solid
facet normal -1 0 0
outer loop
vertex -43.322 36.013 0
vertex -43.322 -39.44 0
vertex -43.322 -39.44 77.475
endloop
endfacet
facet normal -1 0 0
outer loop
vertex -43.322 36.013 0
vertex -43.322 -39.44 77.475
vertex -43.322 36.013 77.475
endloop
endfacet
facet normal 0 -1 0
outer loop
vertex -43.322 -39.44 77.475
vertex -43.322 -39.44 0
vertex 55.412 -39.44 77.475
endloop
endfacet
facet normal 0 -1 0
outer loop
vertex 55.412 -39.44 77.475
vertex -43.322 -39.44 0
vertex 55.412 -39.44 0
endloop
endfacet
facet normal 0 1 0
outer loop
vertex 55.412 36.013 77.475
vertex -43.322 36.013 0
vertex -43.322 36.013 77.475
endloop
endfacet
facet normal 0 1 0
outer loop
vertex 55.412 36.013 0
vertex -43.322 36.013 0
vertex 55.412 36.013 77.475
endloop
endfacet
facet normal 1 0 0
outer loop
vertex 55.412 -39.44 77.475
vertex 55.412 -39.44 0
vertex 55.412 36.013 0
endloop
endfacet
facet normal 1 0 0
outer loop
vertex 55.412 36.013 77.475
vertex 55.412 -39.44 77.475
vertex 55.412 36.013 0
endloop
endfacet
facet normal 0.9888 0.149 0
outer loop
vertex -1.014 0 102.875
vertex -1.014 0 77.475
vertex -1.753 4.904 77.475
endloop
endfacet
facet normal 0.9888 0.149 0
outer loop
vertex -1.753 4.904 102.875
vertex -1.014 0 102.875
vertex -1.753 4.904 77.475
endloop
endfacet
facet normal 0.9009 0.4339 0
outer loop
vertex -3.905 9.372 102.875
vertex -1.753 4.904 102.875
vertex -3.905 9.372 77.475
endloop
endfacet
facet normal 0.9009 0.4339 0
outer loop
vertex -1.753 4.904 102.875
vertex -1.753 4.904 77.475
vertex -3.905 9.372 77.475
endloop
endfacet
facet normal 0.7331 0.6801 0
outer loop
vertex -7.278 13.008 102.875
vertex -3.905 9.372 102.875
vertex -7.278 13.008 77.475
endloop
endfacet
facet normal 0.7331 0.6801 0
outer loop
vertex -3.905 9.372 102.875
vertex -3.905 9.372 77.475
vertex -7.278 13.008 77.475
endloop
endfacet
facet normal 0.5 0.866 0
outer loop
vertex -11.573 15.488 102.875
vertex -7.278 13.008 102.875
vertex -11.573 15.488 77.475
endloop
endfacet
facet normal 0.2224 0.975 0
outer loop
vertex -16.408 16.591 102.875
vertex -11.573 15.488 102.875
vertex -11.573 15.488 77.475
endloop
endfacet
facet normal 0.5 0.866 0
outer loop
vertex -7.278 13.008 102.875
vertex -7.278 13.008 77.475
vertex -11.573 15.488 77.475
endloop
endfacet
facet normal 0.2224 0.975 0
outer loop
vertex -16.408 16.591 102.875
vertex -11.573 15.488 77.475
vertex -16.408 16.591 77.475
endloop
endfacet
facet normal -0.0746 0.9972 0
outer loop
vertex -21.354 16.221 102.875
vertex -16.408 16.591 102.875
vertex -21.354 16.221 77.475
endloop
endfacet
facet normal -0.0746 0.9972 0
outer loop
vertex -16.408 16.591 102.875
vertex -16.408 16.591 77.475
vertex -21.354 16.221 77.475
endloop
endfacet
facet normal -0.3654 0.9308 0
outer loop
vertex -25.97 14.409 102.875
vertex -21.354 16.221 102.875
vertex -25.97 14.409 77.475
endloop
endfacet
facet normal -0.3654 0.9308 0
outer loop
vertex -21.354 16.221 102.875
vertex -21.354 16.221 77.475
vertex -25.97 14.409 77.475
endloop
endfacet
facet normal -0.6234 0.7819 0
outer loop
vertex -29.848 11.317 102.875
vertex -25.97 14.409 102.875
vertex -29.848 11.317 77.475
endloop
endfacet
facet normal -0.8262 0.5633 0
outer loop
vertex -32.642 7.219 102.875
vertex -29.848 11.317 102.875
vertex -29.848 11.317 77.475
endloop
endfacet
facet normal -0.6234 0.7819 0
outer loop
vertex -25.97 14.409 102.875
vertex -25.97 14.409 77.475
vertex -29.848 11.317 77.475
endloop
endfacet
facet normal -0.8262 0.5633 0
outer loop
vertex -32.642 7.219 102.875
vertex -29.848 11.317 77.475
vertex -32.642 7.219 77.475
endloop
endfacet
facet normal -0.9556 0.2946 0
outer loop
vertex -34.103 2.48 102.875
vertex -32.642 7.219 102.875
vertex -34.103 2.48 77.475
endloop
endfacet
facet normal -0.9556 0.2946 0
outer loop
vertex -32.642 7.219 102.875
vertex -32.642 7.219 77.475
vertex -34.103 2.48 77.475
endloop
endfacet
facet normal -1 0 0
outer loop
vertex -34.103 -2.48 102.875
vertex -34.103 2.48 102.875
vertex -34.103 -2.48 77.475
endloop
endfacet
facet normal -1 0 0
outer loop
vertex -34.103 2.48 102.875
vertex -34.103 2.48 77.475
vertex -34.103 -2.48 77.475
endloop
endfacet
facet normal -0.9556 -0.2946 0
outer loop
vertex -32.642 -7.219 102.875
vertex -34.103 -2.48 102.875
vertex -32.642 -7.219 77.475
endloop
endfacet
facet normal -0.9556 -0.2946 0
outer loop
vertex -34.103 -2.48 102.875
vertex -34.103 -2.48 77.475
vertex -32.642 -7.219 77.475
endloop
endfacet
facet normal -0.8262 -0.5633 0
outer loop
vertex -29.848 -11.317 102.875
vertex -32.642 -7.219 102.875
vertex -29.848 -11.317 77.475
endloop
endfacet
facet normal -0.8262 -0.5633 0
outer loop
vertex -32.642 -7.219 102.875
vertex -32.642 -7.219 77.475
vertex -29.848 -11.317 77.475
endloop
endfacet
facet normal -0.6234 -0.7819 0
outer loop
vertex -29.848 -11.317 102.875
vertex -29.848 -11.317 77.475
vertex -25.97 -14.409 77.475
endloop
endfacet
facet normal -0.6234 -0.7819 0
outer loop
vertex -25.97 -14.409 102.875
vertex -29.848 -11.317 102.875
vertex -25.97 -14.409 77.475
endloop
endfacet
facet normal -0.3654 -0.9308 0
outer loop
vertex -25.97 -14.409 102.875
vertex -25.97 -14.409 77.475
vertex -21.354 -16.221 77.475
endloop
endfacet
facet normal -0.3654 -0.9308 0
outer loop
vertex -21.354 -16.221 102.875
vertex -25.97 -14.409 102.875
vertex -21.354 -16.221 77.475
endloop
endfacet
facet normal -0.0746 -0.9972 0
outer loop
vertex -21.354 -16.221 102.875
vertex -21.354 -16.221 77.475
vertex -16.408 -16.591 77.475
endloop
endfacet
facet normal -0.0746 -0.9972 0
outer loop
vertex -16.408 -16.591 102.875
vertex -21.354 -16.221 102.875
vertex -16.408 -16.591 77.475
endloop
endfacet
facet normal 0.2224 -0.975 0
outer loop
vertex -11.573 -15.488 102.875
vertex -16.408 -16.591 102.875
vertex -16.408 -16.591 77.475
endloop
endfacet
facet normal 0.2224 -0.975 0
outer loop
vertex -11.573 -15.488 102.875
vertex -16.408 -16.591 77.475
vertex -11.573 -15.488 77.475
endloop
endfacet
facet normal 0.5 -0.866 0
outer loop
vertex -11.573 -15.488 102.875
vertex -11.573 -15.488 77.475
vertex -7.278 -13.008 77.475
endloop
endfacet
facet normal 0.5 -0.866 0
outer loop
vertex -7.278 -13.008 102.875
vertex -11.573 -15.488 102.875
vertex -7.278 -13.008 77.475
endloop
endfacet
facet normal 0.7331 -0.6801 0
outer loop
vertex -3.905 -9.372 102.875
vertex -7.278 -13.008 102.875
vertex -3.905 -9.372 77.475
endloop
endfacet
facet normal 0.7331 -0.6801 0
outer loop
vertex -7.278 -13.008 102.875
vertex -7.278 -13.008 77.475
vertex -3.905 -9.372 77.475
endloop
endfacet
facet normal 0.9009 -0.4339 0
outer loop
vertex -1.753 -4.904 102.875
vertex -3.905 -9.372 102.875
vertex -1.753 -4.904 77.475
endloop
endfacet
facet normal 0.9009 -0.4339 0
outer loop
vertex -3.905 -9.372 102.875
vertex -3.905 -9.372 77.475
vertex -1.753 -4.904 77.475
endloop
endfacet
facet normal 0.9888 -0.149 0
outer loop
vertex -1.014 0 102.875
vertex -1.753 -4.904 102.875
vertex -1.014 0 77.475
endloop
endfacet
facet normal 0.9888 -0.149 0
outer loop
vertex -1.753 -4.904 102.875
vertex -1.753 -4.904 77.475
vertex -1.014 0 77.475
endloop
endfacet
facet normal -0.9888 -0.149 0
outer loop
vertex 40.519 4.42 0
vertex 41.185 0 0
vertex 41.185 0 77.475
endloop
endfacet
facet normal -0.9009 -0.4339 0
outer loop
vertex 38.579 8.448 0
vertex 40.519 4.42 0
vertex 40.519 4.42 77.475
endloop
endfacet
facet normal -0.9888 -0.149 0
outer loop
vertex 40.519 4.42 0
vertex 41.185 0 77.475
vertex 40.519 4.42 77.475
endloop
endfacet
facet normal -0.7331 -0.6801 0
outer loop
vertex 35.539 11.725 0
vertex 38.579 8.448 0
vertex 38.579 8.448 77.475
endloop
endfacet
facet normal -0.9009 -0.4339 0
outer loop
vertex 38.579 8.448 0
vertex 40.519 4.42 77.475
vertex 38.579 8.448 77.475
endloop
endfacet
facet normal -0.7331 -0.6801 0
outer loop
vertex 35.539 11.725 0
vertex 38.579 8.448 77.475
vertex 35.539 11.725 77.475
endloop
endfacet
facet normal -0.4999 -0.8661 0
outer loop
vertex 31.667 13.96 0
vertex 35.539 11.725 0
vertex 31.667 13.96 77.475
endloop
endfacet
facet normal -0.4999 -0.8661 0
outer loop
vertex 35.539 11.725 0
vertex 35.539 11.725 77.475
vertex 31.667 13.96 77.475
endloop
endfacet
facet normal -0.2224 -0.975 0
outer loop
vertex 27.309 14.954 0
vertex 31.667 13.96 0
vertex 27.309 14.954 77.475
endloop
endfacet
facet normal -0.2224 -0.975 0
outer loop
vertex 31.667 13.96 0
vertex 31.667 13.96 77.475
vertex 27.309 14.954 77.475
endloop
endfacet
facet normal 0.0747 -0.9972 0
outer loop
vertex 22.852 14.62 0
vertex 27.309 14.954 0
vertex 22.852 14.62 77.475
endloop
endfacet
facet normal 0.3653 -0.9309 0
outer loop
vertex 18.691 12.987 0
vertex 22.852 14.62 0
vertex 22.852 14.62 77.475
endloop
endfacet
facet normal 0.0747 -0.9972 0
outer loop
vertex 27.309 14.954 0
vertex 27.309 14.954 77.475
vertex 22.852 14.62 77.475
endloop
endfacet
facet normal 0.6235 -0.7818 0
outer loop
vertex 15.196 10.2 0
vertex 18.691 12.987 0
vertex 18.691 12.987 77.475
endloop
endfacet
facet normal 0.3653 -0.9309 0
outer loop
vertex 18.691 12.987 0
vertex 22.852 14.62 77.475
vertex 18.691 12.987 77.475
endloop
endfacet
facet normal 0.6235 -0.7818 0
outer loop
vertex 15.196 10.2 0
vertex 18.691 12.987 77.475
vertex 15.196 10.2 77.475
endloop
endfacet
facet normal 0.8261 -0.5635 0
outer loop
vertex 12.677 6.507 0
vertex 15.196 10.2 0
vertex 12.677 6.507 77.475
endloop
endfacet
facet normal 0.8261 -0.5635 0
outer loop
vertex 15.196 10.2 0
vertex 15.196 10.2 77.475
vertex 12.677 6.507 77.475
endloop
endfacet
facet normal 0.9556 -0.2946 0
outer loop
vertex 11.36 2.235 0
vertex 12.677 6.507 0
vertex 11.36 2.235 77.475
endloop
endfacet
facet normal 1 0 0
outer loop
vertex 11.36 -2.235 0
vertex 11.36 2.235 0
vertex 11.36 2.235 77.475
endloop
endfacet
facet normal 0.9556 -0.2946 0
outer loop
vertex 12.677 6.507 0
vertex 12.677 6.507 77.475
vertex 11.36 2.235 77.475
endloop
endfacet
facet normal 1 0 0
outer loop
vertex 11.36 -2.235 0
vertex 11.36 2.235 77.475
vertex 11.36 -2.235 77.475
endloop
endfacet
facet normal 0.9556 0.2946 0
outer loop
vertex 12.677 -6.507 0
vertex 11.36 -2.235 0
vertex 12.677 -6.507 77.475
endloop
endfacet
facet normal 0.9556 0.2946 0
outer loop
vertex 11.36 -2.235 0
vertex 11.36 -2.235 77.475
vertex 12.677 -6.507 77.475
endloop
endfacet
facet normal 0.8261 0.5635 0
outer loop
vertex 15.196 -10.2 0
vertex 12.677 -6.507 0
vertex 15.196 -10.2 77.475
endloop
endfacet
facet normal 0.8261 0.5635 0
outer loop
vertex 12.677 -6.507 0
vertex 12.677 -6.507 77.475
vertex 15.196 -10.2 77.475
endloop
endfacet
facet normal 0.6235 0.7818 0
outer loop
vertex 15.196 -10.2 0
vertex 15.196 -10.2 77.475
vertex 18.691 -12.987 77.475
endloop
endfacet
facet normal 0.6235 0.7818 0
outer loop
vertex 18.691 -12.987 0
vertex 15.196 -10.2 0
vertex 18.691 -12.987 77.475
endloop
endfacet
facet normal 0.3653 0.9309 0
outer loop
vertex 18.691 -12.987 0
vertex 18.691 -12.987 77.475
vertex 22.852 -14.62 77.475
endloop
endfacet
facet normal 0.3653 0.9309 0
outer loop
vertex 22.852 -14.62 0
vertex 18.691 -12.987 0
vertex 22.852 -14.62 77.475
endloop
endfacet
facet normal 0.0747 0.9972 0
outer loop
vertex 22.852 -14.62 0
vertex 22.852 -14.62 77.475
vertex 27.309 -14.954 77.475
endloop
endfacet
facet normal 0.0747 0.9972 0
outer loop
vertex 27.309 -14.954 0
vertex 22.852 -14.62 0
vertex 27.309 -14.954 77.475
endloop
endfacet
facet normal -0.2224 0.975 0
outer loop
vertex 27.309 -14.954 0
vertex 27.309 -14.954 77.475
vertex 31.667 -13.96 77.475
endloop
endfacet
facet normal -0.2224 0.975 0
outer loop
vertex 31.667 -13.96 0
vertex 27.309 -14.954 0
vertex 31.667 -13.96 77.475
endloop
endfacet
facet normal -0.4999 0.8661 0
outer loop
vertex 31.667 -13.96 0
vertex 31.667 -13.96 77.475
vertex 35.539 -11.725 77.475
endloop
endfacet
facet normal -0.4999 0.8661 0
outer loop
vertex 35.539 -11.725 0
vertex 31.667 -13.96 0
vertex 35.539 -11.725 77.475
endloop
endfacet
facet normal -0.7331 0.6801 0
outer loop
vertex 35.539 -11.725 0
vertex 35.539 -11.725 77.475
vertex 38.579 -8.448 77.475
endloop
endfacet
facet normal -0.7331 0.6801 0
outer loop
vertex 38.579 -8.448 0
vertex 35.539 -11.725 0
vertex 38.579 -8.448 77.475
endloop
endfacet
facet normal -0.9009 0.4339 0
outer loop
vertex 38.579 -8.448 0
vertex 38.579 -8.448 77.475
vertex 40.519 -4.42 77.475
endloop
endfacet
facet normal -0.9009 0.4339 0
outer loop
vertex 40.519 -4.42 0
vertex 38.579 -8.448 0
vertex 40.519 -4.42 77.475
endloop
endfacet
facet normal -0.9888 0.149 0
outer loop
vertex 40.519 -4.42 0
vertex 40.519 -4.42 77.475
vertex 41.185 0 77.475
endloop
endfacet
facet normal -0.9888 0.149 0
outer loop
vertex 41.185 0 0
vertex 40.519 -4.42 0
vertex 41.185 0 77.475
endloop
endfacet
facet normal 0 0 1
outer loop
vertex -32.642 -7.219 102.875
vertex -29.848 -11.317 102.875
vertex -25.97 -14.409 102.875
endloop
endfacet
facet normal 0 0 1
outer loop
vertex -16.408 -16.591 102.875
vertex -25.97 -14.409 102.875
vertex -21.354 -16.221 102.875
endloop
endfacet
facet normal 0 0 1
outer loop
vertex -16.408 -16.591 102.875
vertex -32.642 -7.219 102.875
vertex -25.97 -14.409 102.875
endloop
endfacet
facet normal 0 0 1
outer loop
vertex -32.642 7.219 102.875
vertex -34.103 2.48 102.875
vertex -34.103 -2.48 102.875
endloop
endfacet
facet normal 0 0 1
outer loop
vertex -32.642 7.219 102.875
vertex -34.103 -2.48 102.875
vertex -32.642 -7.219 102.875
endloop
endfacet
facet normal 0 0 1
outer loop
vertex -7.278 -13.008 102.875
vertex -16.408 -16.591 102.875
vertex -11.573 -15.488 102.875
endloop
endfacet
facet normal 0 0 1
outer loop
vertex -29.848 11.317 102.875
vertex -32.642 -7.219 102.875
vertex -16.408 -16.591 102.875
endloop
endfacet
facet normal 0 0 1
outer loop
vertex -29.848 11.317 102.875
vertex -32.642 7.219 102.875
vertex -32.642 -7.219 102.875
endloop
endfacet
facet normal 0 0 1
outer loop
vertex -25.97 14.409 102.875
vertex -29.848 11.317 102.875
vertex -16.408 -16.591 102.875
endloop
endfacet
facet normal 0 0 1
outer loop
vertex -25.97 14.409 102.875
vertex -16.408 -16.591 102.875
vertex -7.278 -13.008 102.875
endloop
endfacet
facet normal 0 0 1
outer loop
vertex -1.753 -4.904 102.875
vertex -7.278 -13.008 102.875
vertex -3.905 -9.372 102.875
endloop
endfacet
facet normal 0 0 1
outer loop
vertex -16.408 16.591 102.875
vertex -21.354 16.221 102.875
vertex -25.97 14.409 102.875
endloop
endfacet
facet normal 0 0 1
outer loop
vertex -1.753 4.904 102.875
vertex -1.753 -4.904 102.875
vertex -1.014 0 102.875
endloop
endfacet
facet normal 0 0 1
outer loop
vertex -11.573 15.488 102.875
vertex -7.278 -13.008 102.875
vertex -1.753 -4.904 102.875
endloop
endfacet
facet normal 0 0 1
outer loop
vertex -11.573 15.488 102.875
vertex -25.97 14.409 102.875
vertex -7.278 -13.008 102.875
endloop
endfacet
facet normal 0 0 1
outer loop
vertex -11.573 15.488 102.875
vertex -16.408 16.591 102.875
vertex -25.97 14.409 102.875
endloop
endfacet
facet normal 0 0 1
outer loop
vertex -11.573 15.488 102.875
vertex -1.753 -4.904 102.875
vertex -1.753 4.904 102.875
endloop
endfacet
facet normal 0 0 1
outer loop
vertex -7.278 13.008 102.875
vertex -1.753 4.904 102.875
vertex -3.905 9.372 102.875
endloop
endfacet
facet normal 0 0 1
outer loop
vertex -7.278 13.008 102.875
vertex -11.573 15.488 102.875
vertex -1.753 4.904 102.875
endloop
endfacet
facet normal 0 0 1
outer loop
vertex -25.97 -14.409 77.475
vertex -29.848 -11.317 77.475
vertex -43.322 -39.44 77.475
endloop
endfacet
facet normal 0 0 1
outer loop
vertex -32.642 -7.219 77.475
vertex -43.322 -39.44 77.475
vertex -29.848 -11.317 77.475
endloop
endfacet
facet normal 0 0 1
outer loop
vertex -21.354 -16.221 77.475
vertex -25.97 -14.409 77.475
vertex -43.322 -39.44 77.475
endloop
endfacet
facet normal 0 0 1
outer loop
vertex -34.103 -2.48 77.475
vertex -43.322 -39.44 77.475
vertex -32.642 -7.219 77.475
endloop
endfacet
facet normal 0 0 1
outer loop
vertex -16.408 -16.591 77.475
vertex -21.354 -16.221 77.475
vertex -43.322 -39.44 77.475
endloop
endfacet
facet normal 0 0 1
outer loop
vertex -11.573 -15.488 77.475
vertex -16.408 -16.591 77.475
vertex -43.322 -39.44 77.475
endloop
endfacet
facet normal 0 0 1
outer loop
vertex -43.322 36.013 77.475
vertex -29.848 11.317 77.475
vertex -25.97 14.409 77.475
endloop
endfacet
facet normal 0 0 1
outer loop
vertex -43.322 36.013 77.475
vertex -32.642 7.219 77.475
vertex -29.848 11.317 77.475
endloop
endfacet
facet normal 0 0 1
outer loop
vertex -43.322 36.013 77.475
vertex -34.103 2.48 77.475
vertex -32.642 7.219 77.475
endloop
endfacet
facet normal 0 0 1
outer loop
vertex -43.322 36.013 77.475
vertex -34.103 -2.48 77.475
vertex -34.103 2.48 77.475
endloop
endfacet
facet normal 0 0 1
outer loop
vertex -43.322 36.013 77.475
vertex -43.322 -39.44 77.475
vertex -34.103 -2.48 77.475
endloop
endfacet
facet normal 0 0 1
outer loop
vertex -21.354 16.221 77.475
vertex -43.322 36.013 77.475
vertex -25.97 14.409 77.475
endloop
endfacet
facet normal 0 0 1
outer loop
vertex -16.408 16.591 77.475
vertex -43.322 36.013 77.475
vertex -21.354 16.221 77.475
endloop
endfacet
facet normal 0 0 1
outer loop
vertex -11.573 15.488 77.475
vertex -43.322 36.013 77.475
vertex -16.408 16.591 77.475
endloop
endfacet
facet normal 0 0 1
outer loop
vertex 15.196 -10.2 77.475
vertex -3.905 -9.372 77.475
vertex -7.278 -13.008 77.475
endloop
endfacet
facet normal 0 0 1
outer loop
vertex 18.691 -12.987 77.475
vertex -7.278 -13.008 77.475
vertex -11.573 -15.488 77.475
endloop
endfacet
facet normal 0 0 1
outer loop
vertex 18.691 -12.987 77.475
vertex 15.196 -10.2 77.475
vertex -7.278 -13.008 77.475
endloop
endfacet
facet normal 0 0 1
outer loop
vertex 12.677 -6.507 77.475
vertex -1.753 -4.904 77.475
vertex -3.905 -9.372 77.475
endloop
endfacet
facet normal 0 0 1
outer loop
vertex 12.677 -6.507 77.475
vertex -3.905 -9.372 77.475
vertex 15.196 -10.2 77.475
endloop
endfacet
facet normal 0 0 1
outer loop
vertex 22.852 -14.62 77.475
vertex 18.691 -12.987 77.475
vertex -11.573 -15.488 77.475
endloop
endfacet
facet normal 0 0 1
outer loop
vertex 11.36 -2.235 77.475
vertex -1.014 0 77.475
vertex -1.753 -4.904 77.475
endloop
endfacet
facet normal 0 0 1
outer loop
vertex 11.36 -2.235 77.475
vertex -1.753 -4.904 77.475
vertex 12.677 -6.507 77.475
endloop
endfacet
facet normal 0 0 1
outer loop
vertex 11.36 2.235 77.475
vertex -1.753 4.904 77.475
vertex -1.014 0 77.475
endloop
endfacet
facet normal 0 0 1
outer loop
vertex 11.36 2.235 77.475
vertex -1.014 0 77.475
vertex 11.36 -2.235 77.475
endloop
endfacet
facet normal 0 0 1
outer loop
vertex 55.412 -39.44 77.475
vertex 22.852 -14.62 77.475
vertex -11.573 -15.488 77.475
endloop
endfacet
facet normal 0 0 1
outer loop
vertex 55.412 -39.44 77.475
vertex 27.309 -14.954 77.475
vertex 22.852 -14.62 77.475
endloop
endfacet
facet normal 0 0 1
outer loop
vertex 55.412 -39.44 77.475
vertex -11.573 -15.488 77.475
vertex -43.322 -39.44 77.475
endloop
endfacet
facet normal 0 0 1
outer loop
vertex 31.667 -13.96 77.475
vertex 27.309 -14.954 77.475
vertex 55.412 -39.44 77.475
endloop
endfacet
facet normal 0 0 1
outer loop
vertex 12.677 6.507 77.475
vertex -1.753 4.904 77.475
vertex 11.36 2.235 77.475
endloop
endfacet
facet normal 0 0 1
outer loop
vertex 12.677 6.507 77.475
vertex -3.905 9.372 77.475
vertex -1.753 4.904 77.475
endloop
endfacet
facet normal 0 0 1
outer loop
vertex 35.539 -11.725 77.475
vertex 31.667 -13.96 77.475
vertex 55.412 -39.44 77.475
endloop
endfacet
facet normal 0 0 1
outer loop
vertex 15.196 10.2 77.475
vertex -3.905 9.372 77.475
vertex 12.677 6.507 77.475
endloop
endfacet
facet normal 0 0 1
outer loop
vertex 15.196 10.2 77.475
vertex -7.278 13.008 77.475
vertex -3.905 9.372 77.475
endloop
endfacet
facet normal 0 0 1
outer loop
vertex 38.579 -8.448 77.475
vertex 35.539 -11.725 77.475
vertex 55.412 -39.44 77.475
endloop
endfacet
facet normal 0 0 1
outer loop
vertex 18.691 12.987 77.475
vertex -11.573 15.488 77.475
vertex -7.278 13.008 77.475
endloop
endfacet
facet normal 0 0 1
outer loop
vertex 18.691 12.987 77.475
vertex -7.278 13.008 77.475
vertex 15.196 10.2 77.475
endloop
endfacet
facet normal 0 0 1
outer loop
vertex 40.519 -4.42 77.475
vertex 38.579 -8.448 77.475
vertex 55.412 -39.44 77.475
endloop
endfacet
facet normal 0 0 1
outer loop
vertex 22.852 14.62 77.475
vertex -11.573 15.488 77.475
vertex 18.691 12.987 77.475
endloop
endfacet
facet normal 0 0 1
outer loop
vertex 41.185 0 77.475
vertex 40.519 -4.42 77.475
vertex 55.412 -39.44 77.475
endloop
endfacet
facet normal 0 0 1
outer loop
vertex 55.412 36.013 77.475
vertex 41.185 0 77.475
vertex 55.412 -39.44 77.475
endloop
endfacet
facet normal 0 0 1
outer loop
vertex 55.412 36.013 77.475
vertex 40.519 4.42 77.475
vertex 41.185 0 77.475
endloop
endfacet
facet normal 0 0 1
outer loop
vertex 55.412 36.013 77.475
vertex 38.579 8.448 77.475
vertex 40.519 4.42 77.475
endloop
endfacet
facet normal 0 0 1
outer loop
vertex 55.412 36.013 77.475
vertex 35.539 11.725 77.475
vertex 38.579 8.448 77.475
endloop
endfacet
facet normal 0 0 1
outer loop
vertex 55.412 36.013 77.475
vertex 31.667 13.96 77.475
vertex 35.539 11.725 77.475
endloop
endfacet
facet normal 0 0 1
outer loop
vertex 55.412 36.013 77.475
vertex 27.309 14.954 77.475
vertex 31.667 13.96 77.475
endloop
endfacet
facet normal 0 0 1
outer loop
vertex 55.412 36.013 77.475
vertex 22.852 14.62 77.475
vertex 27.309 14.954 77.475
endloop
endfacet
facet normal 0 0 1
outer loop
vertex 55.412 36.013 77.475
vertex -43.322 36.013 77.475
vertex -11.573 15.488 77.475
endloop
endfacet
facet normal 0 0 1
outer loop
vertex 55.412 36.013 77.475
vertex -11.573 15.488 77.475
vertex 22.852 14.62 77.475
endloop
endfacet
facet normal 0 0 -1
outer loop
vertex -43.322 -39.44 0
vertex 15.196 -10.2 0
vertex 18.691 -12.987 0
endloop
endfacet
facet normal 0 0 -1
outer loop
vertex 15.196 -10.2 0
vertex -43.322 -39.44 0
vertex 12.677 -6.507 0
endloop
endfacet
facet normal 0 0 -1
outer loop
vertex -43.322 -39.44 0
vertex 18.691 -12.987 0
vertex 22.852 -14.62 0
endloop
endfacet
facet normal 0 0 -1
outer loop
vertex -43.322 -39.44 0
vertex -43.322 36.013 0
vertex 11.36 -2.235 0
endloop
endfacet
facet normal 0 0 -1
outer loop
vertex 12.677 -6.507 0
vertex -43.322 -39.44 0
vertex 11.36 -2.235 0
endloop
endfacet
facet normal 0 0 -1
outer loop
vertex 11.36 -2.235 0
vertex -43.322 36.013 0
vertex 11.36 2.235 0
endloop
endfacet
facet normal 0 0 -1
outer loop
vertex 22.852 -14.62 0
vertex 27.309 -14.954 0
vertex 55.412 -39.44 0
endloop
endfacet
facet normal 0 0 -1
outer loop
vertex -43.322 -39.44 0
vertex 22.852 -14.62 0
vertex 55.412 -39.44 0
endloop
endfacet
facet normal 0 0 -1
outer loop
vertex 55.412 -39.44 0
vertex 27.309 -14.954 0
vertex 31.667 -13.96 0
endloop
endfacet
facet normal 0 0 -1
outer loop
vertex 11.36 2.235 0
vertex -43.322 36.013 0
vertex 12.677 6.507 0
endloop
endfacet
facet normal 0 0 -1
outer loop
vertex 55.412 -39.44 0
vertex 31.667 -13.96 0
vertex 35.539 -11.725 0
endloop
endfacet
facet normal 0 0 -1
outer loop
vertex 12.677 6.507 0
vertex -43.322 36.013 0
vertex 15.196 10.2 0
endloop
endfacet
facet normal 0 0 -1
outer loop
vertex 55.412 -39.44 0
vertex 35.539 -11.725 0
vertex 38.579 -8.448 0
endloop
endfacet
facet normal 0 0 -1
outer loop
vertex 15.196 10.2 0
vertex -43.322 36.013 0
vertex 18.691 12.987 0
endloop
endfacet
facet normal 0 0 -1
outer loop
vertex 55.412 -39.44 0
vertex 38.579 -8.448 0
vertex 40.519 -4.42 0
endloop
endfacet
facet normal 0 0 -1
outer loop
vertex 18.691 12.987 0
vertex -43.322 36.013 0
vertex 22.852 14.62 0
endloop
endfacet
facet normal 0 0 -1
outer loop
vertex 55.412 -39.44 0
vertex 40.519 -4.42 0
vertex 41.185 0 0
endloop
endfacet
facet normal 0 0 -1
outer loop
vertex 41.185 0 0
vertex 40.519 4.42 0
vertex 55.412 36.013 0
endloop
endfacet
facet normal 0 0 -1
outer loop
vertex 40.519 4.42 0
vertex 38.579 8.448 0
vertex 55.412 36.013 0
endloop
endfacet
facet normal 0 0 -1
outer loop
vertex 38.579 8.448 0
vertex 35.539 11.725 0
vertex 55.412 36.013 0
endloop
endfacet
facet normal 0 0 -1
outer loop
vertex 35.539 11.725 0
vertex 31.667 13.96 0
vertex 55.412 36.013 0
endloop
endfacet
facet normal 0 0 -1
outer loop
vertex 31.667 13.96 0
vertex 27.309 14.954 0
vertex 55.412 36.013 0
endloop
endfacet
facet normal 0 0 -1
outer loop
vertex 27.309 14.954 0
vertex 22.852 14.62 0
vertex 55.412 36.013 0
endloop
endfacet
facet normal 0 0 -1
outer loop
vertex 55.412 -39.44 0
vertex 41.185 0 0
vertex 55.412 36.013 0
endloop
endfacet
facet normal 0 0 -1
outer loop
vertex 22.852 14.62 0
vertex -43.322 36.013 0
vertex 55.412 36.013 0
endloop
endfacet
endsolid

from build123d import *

# Parameters (mm, degrees)
F0_W     = 98.734826
F0_H     = 75.453311
F1_DEPTH = 77.475334
F2_R     = 14.996308
F3_DEPTH = 122.458426
F4_R     = 16.637872
F5_DEPTH = 25.4


with BuildPart() as f1:
    # F0 (on Top) → F1 (new body)
    with BuildSketch(Plane.XY):
        with Locations((6.044999, -1.713828)):
            Rectangle(F0_W, F0_H)
    extrude(amount=F1_DEPTH)

    # F2 (on face) → F3 (cut)
    with BuildSketch(Plane.XY.offset(77.475334)):
        with Locations((26.188662, 0)):
            Circle(F2_R)
    extrude(amount=-F3_DEPTH, mode=Mode.SUBTRACT)

    # F4 (on face) → F5 (join)
    with BuildSketch(Plane.XY.offset(77.475334)):
        with Locations((-17.651428, 0)):
            Circle(F4_R)
    extrude(amount=F5_DEPTH)


solid = f1.part
